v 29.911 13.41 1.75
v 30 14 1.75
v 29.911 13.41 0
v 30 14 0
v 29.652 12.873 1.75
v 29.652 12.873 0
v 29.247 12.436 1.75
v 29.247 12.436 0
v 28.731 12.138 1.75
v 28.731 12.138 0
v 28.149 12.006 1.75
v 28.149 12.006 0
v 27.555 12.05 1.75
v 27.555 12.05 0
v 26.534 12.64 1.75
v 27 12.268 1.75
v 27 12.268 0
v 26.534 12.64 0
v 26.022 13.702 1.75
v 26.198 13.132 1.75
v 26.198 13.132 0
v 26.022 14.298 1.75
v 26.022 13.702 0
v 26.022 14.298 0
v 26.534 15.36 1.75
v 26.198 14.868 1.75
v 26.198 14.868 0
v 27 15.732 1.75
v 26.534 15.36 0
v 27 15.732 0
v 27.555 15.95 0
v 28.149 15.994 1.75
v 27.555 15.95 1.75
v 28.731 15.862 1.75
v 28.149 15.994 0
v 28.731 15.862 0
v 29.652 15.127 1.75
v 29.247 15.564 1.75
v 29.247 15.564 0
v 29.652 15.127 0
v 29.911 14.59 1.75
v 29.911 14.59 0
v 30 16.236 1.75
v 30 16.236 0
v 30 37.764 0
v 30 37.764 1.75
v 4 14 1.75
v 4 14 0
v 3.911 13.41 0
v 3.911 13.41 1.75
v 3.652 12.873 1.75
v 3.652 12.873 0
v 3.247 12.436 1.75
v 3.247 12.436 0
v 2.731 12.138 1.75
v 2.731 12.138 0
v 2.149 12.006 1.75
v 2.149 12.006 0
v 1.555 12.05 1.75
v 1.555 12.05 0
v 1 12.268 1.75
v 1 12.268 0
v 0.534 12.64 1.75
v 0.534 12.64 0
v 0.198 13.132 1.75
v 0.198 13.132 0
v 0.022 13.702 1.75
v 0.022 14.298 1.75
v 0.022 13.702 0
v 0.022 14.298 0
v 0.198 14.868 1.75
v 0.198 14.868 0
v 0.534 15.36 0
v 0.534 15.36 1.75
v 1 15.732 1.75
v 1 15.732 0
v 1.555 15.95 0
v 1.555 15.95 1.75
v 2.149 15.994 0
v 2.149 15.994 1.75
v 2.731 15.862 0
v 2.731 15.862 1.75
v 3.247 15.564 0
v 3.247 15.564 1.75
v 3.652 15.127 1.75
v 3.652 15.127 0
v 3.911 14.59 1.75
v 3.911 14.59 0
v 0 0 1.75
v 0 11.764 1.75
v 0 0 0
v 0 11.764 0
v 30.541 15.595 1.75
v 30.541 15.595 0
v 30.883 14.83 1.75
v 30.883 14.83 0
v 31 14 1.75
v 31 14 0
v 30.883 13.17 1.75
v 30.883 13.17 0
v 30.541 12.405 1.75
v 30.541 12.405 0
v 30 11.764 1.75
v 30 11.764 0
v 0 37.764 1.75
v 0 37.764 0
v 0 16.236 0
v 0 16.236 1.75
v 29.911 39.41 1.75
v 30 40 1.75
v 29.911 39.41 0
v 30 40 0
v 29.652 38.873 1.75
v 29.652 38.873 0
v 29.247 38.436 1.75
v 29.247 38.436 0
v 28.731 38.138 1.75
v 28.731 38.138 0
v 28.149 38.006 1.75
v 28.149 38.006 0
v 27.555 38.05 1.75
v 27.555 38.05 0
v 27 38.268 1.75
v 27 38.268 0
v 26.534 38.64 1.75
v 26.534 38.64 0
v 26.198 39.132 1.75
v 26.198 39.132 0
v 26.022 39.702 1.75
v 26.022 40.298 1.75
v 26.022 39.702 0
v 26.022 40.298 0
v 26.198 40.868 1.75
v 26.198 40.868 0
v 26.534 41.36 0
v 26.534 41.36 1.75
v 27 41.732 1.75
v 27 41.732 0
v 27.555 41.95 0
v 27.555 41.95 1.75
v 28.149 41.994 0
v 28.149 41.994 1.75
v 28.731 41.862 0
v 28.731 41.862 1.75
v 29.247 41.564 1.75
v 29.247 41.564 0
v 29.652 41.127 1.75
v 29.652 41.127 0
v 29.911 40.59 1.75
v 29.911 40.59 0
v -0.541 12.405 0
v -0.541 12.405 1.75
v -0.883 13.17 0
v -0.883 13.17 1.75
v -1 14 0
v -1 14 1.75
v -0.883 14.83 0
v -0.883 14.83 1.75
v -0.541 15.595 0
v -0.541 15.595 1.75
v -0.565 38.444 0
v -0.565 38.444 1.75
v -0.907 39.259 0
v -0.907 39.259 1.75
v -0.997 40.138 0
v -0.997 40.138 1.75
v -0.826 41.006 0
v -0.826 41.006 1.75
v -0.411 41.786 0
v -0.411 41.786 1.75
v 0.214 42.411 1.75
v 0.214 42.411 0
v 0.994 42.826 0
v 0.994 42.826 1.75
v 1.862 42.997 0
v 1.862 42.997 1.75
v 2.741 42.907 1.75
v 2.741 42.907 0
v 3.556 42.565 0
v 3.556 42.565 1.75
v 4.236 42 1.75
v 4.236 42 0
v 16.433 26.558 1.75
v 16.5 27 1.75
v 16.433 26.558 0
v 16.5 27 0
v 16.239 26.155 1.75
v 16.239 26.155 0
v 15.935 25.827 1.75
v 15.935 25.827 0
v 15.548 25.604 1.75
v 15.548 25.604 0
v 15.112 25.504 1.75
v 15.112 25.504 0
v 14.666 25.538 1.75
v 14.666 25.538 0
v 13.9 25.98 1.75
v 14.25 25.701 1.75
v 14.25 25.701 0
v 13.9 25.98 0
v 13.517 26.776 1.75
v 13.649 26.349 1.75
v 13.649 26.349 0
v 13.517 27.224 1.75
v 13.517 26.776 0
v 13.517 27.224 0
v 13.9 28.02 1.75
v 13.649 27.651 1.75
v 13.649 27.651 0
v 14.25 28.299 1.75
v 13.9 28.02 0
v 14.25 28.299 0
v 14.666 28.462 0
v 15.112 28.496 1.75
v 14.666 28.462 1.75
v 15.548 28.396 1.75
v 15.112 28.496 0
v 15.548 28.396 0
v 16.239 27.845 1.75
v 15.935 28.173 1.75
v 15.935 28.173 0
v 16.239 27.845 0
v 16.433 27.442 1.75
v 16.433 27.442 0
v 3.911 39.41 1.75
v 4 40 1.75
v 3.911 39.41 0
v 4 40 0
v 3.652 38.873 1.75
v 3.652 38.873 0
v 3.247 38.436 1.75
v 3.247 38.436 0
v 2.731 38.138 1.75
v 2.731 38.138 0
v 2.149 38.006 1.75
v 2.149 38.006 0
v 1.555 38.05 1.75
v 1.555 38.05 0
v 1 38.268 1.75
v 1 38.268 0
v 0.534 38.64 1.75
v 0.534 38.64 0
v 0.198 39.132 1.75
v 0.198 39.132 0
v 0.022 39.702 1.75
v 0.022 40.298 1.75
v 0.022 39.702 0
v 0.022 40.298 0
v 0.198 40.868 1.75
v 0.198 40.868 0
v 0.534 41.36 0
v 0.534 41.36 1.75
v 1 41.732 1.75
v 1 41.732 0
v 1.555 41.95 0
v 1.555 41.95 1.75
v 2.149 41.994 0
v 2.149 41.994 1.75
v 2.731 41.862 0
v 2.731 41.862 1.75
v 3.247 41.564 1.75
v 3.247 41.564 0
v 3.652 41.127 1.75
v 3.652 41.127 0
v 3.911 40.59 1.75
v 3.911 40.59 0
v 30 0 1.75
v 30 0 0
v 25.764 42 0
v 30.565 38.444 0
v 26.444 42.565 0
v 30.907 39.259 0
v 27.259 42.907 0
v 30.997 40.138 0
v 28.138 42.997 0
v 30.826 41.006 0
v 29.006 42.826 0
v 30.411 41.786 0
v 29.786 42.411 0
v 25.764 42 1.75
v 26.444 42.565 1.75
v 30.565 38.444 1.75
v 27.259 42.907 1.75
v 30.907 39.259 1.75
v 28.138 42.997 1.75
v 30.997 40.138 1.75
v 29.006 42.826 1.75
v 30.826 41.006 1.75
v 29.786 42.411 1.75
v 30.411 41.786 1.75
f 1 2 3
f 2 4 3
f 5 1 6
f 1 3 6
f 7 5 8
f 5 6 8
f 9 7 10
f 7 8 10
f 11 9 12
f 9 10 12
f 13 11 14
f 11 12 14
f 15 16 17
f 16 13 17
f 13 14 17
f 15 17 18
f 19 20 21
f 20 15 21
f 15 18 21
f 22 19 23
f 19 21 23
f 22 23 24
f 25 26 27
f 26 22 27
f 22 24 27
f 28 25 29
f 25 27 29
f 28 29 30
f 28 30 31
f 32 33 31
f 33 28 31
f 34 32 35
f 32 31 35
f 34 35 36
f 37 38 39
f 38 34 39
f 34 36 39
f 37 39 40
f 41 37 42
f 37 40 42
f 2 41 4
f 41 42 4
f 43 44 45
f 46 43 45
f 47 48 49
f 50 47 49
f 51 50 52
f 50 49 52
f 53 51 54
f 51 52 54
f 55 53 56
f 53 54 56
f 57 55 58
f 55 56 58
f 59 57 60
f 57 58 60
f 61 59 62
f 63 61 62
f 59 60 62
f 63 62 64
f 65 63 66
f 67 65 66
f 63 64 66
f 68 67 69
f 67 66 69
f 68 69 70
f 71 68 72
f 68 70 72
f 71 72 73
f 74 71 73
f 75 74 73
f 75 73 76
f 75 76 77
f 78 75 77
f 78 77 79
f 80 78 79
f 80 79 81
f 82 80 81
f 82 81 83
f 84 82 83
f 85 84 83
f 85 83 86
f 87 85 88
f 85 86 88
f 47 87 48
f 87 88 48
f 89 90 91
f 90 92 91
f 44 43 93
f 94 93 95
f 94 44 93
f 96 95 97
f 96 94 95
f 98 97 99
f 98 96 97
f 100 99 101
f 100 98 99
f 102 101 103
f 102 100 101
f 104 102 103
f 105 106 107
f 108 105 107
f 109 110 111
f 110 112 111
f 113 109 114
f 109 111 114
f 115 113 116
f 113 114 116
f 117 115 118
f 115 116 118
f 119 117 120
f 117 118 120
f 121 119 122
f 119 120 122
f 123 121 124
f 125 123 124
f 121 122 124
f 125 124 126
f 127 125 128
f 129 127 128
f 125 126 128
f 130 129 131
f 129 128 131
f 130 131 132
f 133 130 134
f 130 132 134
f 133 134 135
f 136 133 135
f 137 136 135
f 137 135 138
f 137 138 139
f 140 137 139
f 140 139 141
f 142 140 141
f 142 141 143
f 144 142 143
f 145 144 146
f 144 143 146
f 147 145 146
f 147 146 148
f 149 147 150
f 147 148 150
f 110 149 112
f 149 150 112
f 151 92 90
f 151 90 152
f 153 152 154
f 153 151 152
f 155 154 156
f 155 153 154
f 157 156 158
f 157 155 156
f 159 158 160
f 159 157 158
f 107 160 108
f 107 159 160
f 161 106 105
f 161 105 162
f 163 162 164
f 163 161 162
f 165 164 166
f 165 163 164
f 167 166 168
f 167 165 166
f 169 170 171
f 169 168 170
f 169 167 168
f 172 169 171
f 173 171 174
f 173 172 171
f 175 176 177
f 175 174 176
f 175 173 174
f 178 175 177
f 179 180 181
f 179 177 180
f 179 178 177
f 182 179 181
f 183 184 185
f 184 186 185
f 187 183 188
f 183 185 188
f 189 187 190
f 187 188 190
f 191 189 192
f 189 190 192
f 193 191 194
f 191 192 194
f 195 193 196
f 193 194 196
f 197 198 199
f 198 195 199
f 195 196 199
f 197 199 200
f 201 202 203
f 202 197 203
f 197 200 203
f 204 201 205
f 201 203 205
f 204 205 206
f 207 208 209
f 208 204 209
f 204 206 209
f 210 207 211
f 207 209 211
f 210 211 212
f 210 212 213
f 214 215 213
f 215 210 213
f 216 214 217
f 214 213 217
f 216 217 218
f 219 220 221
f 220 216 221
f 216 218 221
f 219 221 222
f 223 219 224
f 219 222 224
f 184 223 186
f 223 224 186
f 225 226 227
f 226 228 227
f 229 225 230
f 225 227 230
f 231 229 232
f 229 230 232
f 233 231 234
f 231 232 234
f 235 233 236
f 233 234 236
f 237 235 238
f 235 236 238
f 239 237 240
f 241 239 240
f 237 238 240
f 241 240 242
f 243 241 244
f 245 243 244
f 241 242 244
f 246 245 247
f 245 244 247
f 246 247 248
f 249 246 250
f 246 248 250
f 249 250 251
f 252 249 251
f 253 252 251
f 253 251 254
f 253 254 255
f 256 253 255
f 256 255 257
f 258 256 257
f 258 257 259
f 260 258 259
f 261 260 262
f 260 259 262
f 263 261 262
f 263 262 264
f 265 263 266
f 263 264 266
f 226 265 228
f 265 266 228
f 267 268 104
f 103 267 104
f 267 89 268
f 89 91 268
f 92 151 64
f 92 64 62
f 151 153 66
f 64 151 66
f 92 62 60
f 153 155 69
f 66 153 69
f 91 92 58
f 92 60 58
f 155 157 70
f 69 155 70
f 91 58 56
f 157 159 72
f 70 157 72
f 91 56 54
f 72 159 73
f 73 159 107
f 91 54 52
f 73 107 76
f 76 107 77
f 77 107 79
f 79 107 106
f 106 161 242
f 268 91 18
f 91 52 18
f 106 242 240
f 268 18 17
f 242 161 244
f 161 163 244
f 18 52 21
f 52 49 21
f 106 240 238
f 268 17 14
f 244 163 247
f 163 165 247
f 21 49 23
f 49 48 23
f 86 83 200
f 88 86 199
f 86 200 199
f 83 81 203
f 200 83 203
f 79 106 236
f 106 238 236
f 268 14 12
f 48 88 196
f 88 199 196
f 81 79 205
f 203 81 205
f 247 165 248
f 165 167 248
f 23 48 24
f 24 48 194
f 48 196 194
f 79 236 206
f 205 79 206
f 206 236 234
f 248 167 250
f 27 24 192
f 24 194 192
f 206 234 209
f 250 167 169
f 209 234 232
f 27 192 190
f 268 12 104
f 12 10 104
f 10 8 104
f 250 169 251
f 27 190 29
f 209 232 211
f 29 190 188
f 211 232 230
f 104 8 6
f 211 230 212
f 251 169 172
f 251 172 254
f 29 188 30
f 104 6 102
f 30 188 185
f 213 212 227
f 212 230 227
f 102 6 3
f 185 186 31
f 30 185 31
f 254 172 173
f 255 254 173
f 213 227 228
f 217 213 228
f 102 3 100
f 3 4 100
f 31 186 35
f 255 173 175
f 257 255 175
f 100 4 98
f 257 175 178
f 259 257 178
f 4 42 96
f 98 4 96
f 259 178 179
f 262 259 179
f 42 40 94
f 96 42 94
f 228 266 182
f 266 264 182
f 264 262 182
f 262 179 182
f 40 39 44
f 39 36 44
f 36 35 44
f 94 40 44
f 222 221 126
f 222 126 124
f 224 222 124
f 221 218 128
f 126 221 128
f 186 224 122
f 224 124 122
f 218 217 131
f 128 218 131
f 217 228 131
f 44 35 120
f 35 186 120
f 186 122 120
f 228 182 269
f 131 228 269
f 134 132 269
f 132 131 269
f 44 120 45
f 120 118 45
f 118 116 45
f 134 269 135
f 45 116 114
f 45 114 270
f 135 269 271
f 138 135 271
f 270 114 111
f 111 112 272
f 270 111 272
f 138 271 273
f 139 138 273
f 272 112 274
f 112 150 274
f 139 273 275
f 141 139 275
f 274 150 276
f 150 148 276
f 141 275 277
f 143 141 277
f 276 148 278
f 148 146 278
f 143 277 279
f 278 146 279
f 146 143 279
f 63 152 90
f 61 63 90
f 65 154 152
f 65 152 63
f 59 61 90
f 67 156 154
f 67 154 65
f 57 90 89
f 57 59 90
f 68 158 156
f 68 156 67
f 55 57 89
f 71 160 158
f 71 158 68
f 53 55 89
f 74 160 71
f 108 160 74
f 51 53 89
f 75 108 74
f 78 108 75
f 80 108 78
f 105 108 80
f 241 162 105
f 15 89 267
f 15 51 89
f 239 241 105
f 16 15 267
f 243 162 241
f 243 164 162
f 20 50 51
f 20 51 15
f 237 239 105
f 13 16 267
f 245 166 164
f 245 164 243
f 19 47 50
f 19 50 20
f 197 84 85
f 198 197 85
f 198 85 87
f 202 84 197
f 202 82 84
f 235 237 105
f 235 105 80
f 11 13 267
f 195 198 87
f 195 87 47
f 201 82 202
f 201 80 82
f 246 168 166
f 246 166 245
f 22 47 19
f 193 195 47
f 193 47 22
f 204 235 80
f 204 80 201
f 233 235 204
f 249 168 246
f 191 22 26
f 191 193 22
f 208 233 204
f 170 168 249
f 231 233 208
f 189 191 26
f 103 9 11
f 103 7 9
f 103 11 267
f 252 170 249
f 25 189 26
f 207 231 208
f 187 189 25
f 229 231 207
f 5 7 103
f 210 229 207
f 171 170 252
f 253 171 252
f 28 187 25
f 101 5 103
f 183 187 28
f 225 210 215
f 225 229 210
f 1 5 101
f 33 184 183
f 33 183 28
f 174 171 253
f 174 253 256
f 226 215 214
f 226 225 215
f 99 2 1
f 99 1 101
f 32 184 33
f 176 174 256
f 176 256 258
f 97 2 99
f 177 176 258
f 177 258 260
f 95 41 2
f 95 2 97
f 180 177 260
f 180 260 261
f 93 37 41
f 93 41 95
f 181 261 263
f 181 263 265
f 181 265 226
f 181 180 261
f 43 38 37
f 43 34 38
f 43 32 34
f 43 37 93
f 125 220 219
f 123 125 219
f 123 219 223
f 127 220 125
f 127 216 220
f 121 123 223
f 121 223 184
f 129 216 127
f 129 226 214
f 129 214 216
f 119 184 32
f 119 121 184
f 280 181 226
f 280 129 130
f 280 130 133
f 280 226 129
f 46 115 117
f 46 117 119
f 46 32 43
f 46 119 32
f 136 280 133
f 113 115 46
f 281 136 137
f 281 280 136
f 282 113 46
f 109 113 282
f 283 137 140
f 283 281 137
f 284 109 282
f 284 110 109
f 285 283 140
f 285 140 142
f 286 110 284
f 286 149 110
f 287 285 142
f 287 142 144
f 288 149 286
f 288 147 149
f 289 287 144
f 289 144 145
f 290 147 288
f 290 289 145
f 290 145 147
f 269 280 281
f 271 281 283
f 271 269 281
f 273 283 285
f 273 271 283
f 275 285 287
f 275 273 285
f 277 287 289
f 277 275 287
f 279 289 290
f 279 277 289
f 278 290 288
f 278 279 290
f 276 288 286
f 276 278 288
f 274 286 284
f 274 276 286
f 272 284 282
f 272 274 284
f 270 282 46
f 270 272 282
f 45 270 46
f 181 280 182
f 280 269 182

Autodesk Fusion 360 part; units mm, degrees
sketch "Sketch1" plane through (0, 0, 0) normal (0, 0, 1) x (1, 0, 0)
  line L0 (0, 0) -> (30, 0)
  line L1 (30, 0) -> (30, 42)
  line L2 (30, 42) -> (0, 42)
  line L3 (0, 42) -> (0, 0)
  circle A0 centre (2, 40) radius 2
  circle A1 centre (28, 40) radius 2
  circle A2 centre (2, 14) radius 2
  circle A3 centre (28, 14) radius 2
  circle A4 centre (2, 40) radius 3
  circle A5 centre (28, 40) radius 3
  circle A6 centre (28, 14) radius 3
  circle A7 centre (2, 14) radius 3
  circle A8 centre (15, 27) radius 1.5
  dimension "d1" = 30
  dimension "d2" = 42
  dimension "d3" = 4
  dimension "d6" = 26
  dimension "d7" = -26
  dimension "d8" = 6
  dimension "d9" = 6
  dimension "d10" = 6
  dimension "d11" = 6
  dimension "d14" = 3
  dimension "d15" = 15
  dimension "d16" = 15
extrude "Extrude1" add sketch "Sketch1" along normal blind 1.75 contours L0 L1 L2 L3 A4 A5 A6 A7 | L3 A7 | L3 A7 | L1 A6 | L1 A6 | L2 L3 A4 | L2 L3 A0 A4 | L1 L2 A1 A5 | L1 L2 A5 | L2 L3 A0 | L1 L2 A1
